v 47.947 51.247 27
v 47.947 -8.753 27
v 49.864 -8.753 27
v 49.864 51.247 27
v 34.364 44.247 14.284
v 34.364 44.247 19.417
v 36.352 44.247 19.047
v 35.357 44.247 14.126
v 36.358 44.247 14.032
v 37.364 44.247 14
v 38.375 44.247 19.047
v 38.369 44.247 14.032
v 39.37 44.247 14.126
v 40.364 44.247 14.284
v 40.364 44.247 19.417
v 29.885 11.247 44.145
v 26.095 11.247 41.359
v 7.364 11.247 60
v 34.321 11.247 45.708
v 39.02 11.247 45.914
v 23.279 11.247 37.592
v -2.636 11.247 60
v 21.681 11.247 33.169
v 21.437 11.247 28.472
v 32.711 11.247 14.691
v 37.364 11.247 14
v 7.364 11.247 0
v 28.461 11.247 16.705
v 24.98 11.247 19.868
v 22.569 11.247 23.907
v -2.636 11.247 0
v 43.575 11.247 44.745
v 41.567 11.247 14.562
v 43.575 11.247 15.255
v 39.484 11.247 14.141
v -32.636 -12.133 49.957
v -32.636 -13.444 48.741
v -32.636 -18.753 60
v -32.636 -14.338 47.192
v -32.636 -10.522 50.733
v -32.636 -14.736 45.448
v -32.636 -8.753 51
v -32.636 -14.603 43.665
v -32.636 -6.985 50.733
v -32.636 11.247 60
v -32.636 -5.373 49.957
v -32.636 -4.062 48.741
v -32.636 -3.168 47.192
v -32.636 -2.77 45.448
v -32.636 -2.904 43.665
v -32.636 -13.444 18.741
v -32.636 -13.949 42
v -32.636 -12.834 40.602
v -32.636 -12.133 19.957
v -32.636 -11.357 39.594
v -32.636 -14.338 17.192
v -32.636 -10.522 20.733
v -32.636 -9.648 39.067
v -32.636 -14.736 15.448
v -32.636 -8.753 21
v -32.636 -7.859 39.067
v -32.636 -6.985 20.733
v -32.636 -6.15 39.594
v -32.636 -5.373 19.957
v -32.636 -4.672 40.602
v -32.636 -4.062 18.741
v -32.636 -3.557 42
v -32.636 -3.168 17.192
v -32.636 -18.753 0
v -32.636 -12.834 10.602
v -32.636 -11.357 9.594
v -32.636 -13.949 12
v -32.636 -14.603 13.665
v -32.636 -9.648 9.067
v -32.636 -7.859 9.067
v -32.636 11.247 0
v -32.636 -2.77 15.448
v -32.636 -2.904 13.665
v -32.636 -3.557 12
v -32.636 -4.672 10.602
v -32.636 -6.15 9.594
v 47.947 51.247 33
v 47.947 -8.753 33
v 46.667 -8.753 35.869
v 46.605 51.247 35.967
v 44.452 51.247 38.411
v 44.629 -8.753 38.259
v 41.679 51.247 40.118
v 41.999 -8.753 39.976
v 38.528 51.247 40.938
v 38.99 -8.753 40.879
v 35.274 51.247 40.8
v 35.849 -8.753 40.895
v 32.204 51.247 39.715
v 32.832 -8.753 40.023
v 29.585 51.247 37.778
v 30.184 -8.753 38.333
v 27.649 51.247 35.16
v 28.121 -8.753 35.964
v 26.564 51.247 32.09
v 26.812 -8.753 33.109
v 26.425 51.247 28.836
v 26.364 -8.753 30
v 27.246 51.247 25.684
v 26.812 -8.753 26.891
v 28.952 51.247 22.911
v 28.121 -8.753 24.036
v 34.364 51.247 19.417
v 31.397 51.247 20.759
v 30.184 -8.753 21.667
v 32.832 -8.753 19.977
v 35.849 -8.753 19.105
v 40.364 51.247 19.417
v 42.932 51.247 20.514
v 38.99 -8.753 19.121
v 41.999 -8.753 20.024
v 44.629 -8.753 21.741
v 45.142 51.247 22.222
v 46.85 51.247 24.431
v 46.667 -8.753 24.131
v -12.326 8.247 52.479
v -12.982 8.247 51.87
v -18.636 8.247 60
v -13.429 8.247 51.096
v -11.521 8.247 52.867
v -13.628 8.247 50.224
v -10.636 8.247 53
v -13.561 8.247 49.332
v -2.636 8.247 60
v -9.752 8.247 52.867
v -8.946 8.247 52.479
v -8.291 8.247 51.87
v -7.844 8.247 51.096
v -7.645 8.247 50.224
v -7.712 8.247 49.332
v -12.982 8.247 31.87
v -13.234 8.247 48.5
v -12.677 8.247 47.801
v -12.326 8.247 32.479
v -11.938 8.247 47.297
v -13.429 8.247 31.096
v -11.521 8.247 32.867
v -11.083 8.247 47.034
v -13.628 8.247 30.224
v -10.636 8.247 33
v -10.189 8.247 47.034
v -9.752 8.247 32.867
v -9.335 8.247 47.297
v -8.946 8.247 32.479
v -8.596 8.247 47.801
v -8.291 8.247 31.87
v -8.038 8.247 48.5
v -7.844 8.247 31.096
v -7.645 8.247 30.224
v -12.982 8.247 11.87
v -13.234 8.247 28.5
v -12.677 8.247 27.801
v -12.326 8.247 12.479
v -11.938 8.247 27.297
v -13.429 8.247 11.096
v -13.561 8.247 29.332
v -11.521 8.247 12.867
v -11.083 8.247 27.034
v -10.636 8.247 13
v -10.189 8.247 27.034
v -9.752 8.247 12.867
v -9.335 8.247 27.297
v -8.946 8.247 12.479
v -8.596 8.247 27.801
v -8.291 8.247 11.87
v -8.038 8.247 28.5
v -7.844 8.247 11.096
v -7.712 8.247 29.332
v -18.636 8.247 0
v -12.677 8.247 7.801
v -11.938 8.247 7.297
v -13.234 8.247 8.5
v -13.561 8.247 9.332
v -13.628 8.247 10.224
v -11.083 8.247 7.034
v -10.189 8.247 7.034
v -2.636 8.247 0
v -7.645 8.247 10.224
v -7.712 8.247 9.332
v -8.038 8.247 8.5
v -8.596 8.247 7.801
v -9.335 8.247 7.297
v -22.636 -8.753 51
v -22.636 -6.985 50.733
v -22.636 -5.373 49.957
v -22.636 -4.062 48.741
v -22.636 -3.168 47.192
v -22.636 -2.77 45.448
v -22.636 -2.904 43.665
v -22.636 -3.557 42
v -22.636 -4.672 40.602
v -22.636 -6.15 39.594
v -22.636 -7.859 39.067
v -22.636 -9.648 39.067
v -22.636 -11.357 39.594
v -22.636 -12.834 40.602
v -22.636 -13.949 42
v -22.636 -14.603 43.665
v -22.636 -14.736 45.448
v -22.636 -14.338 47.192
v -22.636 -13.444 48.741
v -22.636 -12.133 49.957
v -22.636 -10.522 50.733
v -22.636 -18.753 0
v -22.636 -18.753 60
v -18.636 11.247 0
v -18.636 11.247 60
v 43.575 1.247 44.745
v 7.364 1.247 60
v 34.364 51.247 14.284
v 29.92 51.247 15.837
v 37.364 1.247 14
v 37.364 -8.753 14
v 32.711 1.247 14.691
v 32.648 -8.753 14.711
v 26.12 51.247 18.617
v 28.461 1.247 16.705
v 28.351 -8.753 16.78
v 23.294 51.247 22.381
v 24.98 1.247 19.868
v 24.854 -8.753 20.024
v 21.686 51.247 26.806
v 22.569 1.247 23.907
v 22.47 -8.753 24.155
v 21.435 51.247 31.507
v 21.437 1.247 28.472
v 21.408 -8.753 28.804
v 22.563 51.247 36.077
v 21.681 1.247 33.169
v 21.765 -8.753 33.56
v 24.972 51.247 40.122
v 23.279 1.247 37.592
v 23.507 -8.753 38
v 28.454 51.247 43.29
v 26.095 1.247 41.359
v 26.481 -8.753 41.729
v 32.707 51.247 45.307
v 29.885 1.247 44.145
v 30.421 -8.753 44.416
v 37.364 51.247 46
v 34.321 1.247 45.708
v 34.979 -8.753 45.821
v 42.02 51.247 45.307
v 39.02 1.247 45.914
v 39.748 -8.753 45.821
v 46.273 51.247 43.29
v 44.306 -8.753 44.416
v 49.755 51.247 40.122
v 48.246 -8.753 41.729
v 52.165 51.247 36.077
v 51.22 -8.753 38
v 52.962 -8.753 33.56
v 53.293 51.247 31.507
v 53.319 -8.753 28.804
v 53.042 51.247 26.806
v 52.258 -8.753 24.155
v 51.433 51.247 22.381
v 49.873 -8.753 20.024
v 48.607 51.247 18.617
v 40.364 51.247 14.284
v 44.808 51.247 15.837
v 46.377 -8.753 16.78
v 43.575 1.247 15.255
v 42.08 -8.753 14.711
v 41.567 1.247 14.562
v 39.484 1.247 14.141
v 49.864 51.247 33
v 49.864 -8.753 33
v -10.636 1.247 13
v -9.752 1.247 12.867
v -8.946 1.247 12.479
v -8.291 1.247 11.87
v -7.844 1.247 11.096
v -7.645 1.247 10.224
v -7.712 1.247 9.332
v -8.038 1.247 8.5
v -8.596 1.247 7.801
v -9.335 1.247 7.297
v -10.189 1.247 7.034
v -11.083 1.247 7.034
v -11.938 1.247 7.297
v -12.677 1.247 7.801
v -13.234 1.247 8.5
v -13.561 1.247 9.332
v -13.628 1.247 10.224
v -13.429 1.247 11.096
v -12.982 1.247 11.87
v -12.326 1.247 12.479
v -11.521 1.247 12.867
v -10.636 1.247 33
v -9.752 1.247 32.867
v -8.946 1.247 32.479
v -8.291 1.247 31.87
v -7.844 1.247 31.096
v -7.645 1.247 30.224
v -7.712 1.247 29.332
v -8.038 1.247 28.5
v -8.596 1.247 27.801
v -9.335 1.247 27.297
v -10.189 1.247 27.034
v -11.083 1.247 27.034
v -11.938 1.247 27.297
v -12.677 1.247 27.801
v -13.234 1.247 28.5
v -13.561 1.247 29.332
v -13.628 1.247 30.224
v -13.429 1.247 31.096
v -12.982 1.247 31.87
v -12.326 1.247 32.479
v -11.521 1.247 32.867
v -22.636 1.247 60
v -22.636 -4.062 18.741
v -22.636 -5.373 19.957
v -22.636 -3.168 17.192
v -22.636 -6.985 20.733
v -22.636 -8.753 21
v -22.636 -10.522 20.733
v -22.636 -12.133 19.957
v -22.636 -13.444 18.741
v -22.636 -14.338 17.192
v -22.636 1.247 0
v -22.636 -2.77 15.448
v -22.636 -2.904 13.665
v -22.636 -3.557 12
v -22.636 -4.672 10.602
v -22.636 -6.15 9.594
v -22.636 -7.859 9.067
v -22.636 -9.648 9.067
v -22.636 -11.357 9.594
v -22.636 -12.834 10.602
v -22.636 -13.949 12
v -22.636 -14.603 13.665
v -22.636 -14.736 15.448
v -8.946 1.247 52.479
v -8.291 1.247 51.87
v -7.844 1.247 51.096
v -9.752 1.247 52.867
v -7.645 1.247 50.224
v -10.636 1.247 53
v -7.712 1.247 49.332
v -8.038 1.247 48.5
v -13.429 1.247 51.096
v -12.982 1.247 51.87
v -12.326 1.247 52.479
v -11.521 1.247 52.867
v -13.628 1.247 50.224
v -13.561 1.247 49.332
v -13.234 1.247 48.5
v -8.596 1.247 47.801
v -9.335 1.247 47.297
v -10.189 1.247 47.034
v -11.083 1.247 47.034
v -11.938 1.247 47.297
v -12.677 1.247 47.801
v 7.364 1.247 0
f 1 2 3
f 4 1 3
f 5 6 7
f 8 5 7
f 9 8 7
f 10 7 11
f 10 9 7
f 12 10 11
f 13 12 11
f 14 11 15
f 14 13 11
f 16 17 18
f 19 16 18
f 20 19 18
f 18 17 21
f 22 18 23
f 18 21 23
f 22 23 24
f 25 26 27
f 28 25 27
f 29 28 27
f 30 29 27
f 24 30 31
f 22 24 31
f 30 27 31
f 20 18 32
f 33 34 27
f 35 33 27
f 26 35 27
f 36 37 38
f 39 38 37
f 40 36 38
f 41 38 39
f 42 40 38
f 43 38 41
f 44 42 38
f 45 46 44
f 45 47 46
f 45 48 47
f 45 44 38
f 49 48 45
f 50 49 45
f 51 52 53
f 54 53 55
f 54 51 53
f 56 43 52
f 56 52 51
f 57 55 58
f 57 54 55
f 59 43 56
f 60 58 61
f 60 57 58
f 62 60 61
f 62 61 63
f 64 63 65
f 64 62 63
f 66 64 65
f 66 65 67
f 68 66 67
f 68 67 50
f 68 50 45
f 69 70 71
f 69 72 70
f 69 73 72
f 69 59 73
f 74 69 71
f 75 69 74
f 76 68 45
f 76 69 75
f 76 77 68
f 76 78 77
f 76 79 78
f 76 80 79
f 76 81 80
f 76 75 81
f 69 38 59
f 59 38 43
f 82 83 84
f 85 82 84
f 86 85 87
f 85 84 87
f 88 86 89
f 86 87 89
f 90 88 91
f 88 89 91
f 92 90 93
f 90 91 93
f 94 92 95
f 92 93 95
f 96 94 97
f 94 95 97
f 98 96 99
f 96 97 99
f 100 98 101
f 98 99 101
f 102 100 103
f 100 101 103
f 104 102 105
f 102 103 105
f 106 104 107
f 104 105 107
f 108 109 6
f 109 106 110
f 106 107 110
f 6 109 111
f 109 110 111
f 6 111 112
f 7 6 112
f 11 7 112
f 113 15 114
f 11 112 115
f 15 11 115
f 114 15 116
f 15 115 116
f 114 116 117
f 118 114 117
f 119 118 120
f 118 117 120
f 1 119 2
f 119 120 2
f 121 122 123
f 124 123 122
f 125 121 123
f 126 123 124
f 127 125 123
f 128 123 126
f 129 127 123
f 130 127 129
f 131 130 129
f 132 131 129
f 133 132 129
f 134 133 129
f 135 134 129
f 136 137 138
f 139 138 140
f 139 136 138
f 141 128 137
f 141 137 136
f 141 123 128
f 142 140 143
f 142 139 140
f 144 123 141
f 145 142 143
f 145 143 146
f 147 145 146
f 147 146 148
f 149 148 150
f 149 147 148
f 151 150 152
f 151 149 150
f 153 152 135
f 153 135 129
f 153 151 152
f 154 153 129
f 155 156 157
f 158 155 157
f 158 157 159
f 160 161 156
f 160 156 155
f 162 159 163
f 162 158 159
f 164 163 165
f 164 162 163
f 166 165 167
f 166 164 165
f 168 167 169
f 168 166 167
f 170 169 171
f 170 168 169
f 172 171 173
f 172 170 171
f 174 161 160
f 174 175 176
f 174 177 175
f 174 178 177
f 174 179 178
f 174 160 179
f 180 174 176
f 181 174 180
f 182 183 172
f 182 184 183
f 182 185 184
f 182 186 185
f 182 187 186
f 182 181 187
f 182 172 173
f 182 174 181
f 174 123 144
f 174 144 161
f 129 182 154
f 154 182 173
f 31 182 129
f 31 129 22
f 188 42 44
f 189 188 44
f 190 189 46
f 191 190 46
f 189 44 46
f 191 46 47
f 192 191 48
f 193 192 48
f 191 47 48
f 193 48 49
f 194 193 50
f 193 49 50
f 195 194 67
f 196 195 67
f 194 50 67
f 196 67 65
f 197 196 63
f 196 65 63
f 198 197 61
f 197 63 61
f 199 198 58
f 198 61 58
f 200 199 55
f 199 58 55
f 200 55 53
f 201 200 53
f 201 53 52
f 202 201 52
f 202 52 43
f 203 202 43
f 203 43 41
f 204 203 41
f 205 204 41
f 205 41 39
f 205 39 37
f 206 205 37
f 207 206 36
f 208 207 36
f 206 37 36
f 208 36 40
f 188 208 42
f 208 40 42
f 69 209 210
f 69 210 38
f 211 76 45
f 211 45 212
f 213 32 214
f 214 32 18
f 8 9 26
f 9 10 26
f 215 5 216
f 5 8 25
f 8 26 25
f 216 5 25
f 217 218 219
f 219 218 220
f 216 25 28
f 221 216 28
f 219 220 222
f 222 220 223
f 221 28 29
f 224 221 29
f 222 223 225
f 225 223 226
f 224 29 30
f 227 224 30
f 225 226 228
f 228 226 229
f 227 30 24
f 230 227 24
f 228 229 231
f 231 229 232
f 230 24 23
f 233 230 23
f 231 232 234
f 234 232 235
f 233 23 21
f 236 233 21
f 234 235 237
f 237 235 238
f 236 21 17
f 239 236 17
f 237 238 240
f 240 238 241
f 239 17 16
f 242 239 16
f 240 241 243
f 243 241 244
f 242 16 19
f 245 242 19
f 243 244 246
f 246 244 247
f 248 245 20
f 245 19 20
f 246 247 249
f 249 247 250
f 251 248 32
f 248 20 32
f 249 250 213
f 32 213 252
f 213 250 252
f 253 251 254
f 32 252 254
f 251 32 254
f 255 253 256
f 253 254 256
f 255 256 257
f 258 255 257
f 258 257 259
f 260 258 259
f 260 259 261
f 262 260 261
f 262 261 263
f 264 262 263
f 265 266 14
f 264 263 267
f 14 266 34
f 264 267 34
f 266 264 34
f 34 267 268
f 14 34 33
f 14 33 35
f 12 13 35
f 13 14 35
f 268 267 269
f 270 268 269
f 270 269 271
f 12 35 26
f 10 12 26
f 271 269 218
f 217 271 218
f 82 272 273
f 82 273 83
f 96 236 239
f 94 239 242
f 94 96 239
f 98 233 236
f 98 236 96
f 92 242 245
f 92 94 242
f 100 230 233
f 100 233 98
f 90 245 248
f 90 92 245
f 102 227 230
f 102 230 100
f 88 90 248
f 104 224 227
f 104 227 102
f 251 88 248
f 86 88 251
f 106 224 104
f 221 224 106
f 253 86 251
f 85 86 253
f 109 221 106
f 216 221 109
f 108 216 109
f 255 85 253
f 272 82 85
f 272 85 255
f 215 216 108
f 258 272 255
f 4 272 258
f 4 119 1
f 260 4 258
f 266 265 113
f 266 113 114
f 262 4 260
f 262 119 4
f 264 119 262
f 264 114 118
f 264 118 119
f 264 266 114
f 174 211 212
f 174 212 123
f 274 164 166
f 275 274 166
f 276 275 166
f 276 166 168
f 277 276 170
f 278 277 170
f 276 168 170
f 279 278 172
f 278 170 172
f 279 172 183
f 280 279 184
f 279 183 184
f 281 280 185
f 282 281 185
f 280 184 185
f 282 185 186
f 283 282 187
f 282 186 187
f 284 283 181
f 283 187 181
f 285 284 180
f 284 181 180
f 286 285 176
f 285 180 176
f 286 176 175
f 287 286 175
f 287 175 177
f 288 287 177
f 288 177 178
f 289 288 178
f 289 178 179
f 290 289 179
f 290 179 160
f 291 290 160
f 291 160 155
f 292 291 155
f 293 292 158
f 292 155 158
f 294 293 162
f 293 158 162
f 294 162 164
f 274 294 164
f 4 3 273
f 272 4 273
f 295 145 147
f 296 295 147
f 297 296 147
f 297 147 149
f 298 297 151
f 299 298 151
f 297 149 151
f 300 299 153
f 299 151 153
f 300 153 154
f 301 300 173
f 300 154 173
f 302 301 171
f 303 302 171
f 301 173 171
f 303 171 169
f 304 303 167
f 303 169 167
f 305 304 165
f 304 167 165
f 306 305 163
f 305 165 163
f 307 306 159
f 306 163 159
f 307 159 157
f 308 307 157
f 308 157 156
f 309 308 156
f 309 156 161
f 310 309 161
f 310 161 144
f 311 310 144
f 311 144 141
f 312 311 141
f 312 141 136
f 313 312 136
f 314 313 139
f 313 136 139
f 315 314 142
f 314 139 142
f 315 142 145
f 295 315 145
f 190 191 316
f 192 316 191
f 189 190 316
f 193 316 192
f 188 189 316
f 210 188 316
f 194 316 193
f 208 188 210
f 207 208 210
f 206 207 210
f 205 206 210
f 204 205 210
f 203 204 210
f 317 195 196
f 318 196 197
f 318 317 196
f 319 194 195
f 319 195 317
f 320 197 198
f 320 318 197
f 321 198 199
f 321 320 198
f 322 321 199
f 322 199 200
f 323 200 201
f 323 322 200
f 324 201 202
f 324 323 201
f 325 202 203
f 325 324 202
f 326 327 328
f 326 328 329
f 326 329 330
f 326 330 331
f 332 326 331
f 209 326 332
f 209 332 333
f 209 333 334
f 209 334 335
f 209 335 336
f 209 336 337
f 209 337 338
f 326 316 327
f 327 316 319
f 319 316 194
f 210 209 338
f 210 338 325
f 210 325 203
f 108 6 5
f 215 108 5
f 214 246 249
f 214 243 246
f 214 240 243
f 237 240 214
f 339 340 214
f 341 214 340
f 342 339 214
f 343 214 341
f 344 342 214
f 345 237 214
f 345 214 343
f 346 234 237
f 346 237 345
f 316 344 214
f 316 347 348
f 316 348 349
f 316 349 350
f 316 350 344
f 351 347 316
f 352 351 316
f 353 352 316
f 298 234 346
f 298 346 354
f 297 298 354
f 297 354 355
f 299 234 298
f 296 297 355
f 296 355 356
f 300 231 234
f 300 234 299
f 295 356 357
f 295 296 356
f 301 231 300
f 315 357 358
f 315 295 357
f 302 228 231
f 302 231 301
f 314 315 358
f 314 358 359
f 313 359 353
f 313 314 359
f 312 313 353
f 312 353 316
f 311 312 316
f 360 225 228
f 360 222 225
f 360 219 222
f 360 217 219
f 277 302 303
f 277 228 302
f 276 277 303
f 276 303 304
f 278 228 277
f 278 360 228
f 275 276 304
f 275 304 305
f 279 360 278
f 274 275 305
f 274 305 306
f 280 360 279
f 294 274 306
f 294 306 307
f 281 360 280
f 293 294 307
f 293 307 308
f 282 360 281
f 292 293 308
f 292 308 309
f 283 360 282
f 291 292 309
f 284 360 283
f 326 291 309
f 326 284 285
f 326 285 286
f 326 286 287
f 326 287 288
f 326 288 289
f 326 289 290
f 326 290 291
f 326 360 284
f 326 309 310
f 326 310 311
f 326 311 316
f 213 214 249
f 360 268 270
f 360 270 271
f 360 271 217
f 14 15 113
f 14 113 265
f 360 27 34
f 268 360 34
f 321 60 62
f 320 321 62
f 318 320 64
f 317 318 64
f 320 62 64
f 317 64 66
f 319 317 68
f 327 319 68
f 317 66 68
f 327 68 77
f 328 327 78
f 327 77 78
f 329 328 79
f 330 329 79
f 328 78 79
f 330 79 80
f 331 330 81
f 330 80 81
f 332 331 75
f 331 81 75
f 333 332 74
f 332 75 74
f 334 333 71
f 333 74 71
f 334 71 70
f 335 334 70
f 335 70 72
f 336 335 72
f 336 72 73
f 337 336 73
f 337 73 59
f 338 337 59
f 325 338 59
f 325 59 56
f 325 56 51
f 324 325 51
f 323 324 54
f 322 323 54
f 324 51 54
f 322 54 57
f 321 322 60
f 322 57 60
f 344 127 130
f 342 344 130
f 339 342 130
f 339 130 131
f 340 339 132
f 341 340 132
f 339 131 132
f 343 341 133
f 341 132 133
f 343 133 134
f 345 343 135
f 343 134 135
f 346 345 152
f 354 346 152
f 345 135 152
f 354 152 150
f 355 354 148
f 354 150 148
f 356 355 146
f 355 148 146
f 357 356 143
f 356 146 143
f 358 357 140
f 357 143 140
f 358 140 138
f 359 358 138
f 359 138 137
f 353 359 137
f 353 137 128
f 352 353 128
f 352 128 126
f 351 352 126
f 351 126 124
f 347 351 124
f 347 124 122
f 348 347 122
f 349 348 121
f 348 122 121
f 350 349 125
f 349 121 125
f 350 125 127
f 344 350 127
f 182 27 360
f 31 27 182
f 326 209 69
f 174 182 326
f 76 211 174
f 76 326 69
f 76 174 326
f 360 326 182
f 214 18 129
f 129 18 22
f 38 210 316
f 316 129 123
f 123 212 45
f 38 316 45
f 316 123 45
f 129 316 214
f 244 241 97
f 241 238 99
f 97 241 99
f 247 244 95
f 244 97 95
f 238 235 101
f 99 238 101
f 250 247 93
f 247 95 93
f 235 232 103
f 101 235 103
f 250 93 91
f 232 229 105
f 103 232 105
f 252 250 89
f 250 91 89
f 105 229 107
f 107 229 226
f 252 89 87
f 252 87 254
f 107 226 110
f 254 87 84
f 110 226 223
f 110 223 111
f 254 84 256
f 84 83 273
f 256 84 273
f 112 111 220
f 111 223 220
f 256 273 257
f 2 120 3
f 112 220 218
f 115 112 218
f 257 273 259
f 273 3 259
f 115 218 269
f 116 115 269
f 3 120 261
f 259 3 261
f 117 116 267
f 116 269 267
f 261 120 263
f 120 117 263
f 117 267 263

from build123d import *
from build123d.topology import SkipClean

# Parameters (mm, degrees)
BOSS_EXTRUDE1_DEPTH      = 60
SKETCH3_R                = 6.000000000000003
SKETCH3_R_2              = 5.999999999999998
CUT_EXTRUDE1_DEPTH       = 10
SKETCH4_R                = 3.0000000000000027
SKETCH4_R_2              = 3.0000000000000004
SKETCH4_R_3              = 2.9999999999999996
CUT_EXTRUDE2_DEPTH       = 7
BOSS_EXTRUDE2_DEPTH      = 40
BOSS_EXTRUDE2_DEPTH_BACK = 20
CUT_EXTRUDE3_DEPTH       = 90.70884954089212
CUT_EXTRUDE3_DEPTH_BACK  = 40
BOSS_EXTRUDE3_DEPTH      = 10
CUT_EXTRUDE4_START       = -60
SKETCH9_R                = 10.999999999999993
CUT_EXTRUDE4_DEPTH       = 60
CUT_EXTRUDE5_DEPTH       = 60
SKETCH9_4_W              = 6
SKETCH9_4_H              = 24.979661142970425
CUT_EXTRUDE6_DEPTH       = 7


with BuildPart() as part:
    # Sketch2 → Boss-Extrude1 (new body)
    with BuildSketch(Plane.XY):
        Polygon((-32.63636363636363, -18.753246753246753), (-32.63636363636363, 11.246753246753245), (-18.636363636363633, 11.246753246753245), (-18.636363636363633, 8.246753246753245), (-2.6363636363636314, 8.246753246753245), (-2.6363636363636314, 11.246753246753245), (37.363636363636374, 11.246753246753245), (37.363636363636374, 1.2467532467532443), (-22.636363636363637, 1.2467532467532365), (-22.63636363636363, -18.75324675324675), align=None)
    extrude(amount=BOSS_EXTRUDE1_DEPTH)

    # Sketch3 → Cut-Extrude1 (cut)
    with BuildSketch(Plane.ZY.offset(32.63636363636363)):
        with Locations((45, -8.753246753246755)):
            Circle(SKETCH3_R)
        with Locations((15, -8.753246753246755)):
            Circle(SKETCH3_R_2)
    extrude(amount=-CUT_EXTRUDE1_DEPTH, mode=Mode.SUBTRACT)

    # Sketch4 → Cut-Extrude2 (cut)
    with BuildSketch(Plane(origin=(0, 8.246753246753245, 0), x_dir=(1, 0, 0), z_dir=(0, 1, 0))):
        with Locations(Location((-10.63636363636363, -49.99999999999999, 0), (0, 0, 270))):
            Circle(SKETCH4_R)
        with Locations(Location((-10.636363636363631, -9.999999999999995, 0), (0, 0, 270))):
            Circle(SKETCH4_R_2)
        with Locations(Location((-10.63636363636363, -29.999999999999996, 0), (0, 0, 270))):
            Circle(SKETCH4_R_3)
    extrude(amount=-CUT_EXTRUDE2_DEPTH, mode=Mode.SUBTRACT)

    # Sketch5 → Boss-Extrude2 (add, two sides: drawn at the far end of the back side and taken through both)
    with BuildSketch(Plane(origin=(0, 11.246753246753245, 0), x_dir=(1, 0, 0), z_dir=(0, 1, 0)).offset(-BOSS_EXTRUDE2_DEPTH_BACK)):
        with BuildLine():
            ThreePointArc((37.36363636363612, -46), (40.532227080018274, -45.6831129841004), (43.57530713931024, -44.745004109007205))
            ThreePointArc((43.57530713931024, -44.745004109007205), (50.693803887167014, -38.849103558813695), (53.363636363636374, -30.000000000000004))
            ThreePointArc((53.363636363636374, -30), (50.693803887167014, -21.150896441186312), (43.57530713931025, -15.254995890992799))
            ThreePointArc((43.57530713931025, -15.254995890992799), (40.53222708001828, -14.316887015899601), (37.36363636363611, -13.999999999999996))
            Line((37.363636363636374, -14), (37.363636363636374, -19.000000000000007))
            ThreePointArc((37.36363636363639, -19.000000000000007), (45.141810956688396, -22.22182540694799), (48.36363636363637, -30))
            ThreePointArc((48.36363636363637, -30.000000000000004), (45.14181095668839, -37.77817459305202), (37.363636363636374, -40.99999999999999))
            Line((37.363636363636374, -40.99999999999999), (37.363636363636374, -46))
        make_face()
        with BuildLine():
            ThreePointArc((37.36363636363611, -13.999999999999996), (21.36363636363637, -29.999999999999996), (37.36363636363612, -46))
            Line((37.363636363636374, -46), (37.363636363636374, -40.99999999999999))
            ThreePointArc((37.363636363636374, -40.99999999999999), (26.36363636363638, -29.99999999999999), (37.36363636363639, -19.000000000000007))
            Line((37.363636363636374, -19.000000000000007), (37.363636363636374, -14))
        make_face()
    extrude(amount=BOSS_EXTRUDE2_DEPTH + BOSS_EXTRUDE2_DEPTH_BACK)

    # Sketch5<4> → Cut-Extrude3 (cut, two sides: drawn at the far end of the back side and taken through both)
    with BuildSketch(Plane(origin=(0, 11.246753246753245, 0), x_dir=(1, 0, 0), z_dir=(0, 1, 0)).offset(-CUT_EXTRUDE3_DEPTH_BACK)):
        Polygon((7.363636363636369, 0), (37.36363636363637, -12.638187272961233), (37.363636363636374, 0), align=None)
        Polygon((37.363636363636374, -47.36181272703875), (7.36363636363637, -60), (37.363636363636374, -60), align=None)
    extrude(amount=CUT_EXTRUDE3_DEPTH + CUT_EXTRUDE3_DEPTH_BACK, mode=Mode.SUBTRACT)

    # Sketch7 → Boss-Extrude3 (add)
    with BuildSketch(Plane(origin=(0, 11.246753246753245, 0), x_dir=(1, 0, 0), z_dir=(0, 1, 0))):
        Polygon((37.363636363636374, -12.638187272961241), (43.57530713931025, -15.254995890992793), (43.57530713931024, -44.7450041090072), (37.363636363636374, -47.361812727038746), align=None)
    extrude(amount=-BOSS_EXTRUDE3_DEPTH)

    # Sketch9 → Cut-Extrude4 (cut)
    with SkipClean():  # the faces are left unmerged after this step: merging them gives an invalid solid
        with BuildSketch(Plane(origin=(0, 51.24675324675325, 0), x_dir=(1, 0, 0), z_dir=(0, 1, 0)).offset(CUT_EXTRUDE4_START)):
            with Locations(Location((37.363636363636374, -30, 0), (0, 0, 270))):
                Circle(SKETCH9_R)
        extrude(amount=CUT_EXTRUDE4_DEPTH, mode=Mode.SUBTRACT)

    # Sketch9<3> → Cut-Extrude5 (cut)
    with BuildSketch(Plane(origin=(0, 51.24675324675325, 0), x_dir=(1, 0, 0), z_dir=(0, 1, 0))):
        Polygon((49.86363636363637, -27), (49.86363636363636, -33), (47.38496613189031, -32.99999999999999), (47.38496613189031, -27), align=None)
    extrude(amount=-CUT_EXTRUDE5_DEPTH, mode=Mode.SUBTRACT)

    # Sketch9<4> → Cut-Extrude6 (cut)
    with BuildSketch(Plane(origin=(0, 51.24675324675325, 0), x_dir=(1, 0, 0), z_dir=(0, 1, 0))):
        with Locations((37.363636363636374, -17.510169428514793)):
            Rectangle(SKETCH9_4_W, SKETCH9_4_H)
    extrude(amount=-CUT_EXTRUDE6_DEPTH, mode=Mode.SUBTRACT)


solid = part.part
